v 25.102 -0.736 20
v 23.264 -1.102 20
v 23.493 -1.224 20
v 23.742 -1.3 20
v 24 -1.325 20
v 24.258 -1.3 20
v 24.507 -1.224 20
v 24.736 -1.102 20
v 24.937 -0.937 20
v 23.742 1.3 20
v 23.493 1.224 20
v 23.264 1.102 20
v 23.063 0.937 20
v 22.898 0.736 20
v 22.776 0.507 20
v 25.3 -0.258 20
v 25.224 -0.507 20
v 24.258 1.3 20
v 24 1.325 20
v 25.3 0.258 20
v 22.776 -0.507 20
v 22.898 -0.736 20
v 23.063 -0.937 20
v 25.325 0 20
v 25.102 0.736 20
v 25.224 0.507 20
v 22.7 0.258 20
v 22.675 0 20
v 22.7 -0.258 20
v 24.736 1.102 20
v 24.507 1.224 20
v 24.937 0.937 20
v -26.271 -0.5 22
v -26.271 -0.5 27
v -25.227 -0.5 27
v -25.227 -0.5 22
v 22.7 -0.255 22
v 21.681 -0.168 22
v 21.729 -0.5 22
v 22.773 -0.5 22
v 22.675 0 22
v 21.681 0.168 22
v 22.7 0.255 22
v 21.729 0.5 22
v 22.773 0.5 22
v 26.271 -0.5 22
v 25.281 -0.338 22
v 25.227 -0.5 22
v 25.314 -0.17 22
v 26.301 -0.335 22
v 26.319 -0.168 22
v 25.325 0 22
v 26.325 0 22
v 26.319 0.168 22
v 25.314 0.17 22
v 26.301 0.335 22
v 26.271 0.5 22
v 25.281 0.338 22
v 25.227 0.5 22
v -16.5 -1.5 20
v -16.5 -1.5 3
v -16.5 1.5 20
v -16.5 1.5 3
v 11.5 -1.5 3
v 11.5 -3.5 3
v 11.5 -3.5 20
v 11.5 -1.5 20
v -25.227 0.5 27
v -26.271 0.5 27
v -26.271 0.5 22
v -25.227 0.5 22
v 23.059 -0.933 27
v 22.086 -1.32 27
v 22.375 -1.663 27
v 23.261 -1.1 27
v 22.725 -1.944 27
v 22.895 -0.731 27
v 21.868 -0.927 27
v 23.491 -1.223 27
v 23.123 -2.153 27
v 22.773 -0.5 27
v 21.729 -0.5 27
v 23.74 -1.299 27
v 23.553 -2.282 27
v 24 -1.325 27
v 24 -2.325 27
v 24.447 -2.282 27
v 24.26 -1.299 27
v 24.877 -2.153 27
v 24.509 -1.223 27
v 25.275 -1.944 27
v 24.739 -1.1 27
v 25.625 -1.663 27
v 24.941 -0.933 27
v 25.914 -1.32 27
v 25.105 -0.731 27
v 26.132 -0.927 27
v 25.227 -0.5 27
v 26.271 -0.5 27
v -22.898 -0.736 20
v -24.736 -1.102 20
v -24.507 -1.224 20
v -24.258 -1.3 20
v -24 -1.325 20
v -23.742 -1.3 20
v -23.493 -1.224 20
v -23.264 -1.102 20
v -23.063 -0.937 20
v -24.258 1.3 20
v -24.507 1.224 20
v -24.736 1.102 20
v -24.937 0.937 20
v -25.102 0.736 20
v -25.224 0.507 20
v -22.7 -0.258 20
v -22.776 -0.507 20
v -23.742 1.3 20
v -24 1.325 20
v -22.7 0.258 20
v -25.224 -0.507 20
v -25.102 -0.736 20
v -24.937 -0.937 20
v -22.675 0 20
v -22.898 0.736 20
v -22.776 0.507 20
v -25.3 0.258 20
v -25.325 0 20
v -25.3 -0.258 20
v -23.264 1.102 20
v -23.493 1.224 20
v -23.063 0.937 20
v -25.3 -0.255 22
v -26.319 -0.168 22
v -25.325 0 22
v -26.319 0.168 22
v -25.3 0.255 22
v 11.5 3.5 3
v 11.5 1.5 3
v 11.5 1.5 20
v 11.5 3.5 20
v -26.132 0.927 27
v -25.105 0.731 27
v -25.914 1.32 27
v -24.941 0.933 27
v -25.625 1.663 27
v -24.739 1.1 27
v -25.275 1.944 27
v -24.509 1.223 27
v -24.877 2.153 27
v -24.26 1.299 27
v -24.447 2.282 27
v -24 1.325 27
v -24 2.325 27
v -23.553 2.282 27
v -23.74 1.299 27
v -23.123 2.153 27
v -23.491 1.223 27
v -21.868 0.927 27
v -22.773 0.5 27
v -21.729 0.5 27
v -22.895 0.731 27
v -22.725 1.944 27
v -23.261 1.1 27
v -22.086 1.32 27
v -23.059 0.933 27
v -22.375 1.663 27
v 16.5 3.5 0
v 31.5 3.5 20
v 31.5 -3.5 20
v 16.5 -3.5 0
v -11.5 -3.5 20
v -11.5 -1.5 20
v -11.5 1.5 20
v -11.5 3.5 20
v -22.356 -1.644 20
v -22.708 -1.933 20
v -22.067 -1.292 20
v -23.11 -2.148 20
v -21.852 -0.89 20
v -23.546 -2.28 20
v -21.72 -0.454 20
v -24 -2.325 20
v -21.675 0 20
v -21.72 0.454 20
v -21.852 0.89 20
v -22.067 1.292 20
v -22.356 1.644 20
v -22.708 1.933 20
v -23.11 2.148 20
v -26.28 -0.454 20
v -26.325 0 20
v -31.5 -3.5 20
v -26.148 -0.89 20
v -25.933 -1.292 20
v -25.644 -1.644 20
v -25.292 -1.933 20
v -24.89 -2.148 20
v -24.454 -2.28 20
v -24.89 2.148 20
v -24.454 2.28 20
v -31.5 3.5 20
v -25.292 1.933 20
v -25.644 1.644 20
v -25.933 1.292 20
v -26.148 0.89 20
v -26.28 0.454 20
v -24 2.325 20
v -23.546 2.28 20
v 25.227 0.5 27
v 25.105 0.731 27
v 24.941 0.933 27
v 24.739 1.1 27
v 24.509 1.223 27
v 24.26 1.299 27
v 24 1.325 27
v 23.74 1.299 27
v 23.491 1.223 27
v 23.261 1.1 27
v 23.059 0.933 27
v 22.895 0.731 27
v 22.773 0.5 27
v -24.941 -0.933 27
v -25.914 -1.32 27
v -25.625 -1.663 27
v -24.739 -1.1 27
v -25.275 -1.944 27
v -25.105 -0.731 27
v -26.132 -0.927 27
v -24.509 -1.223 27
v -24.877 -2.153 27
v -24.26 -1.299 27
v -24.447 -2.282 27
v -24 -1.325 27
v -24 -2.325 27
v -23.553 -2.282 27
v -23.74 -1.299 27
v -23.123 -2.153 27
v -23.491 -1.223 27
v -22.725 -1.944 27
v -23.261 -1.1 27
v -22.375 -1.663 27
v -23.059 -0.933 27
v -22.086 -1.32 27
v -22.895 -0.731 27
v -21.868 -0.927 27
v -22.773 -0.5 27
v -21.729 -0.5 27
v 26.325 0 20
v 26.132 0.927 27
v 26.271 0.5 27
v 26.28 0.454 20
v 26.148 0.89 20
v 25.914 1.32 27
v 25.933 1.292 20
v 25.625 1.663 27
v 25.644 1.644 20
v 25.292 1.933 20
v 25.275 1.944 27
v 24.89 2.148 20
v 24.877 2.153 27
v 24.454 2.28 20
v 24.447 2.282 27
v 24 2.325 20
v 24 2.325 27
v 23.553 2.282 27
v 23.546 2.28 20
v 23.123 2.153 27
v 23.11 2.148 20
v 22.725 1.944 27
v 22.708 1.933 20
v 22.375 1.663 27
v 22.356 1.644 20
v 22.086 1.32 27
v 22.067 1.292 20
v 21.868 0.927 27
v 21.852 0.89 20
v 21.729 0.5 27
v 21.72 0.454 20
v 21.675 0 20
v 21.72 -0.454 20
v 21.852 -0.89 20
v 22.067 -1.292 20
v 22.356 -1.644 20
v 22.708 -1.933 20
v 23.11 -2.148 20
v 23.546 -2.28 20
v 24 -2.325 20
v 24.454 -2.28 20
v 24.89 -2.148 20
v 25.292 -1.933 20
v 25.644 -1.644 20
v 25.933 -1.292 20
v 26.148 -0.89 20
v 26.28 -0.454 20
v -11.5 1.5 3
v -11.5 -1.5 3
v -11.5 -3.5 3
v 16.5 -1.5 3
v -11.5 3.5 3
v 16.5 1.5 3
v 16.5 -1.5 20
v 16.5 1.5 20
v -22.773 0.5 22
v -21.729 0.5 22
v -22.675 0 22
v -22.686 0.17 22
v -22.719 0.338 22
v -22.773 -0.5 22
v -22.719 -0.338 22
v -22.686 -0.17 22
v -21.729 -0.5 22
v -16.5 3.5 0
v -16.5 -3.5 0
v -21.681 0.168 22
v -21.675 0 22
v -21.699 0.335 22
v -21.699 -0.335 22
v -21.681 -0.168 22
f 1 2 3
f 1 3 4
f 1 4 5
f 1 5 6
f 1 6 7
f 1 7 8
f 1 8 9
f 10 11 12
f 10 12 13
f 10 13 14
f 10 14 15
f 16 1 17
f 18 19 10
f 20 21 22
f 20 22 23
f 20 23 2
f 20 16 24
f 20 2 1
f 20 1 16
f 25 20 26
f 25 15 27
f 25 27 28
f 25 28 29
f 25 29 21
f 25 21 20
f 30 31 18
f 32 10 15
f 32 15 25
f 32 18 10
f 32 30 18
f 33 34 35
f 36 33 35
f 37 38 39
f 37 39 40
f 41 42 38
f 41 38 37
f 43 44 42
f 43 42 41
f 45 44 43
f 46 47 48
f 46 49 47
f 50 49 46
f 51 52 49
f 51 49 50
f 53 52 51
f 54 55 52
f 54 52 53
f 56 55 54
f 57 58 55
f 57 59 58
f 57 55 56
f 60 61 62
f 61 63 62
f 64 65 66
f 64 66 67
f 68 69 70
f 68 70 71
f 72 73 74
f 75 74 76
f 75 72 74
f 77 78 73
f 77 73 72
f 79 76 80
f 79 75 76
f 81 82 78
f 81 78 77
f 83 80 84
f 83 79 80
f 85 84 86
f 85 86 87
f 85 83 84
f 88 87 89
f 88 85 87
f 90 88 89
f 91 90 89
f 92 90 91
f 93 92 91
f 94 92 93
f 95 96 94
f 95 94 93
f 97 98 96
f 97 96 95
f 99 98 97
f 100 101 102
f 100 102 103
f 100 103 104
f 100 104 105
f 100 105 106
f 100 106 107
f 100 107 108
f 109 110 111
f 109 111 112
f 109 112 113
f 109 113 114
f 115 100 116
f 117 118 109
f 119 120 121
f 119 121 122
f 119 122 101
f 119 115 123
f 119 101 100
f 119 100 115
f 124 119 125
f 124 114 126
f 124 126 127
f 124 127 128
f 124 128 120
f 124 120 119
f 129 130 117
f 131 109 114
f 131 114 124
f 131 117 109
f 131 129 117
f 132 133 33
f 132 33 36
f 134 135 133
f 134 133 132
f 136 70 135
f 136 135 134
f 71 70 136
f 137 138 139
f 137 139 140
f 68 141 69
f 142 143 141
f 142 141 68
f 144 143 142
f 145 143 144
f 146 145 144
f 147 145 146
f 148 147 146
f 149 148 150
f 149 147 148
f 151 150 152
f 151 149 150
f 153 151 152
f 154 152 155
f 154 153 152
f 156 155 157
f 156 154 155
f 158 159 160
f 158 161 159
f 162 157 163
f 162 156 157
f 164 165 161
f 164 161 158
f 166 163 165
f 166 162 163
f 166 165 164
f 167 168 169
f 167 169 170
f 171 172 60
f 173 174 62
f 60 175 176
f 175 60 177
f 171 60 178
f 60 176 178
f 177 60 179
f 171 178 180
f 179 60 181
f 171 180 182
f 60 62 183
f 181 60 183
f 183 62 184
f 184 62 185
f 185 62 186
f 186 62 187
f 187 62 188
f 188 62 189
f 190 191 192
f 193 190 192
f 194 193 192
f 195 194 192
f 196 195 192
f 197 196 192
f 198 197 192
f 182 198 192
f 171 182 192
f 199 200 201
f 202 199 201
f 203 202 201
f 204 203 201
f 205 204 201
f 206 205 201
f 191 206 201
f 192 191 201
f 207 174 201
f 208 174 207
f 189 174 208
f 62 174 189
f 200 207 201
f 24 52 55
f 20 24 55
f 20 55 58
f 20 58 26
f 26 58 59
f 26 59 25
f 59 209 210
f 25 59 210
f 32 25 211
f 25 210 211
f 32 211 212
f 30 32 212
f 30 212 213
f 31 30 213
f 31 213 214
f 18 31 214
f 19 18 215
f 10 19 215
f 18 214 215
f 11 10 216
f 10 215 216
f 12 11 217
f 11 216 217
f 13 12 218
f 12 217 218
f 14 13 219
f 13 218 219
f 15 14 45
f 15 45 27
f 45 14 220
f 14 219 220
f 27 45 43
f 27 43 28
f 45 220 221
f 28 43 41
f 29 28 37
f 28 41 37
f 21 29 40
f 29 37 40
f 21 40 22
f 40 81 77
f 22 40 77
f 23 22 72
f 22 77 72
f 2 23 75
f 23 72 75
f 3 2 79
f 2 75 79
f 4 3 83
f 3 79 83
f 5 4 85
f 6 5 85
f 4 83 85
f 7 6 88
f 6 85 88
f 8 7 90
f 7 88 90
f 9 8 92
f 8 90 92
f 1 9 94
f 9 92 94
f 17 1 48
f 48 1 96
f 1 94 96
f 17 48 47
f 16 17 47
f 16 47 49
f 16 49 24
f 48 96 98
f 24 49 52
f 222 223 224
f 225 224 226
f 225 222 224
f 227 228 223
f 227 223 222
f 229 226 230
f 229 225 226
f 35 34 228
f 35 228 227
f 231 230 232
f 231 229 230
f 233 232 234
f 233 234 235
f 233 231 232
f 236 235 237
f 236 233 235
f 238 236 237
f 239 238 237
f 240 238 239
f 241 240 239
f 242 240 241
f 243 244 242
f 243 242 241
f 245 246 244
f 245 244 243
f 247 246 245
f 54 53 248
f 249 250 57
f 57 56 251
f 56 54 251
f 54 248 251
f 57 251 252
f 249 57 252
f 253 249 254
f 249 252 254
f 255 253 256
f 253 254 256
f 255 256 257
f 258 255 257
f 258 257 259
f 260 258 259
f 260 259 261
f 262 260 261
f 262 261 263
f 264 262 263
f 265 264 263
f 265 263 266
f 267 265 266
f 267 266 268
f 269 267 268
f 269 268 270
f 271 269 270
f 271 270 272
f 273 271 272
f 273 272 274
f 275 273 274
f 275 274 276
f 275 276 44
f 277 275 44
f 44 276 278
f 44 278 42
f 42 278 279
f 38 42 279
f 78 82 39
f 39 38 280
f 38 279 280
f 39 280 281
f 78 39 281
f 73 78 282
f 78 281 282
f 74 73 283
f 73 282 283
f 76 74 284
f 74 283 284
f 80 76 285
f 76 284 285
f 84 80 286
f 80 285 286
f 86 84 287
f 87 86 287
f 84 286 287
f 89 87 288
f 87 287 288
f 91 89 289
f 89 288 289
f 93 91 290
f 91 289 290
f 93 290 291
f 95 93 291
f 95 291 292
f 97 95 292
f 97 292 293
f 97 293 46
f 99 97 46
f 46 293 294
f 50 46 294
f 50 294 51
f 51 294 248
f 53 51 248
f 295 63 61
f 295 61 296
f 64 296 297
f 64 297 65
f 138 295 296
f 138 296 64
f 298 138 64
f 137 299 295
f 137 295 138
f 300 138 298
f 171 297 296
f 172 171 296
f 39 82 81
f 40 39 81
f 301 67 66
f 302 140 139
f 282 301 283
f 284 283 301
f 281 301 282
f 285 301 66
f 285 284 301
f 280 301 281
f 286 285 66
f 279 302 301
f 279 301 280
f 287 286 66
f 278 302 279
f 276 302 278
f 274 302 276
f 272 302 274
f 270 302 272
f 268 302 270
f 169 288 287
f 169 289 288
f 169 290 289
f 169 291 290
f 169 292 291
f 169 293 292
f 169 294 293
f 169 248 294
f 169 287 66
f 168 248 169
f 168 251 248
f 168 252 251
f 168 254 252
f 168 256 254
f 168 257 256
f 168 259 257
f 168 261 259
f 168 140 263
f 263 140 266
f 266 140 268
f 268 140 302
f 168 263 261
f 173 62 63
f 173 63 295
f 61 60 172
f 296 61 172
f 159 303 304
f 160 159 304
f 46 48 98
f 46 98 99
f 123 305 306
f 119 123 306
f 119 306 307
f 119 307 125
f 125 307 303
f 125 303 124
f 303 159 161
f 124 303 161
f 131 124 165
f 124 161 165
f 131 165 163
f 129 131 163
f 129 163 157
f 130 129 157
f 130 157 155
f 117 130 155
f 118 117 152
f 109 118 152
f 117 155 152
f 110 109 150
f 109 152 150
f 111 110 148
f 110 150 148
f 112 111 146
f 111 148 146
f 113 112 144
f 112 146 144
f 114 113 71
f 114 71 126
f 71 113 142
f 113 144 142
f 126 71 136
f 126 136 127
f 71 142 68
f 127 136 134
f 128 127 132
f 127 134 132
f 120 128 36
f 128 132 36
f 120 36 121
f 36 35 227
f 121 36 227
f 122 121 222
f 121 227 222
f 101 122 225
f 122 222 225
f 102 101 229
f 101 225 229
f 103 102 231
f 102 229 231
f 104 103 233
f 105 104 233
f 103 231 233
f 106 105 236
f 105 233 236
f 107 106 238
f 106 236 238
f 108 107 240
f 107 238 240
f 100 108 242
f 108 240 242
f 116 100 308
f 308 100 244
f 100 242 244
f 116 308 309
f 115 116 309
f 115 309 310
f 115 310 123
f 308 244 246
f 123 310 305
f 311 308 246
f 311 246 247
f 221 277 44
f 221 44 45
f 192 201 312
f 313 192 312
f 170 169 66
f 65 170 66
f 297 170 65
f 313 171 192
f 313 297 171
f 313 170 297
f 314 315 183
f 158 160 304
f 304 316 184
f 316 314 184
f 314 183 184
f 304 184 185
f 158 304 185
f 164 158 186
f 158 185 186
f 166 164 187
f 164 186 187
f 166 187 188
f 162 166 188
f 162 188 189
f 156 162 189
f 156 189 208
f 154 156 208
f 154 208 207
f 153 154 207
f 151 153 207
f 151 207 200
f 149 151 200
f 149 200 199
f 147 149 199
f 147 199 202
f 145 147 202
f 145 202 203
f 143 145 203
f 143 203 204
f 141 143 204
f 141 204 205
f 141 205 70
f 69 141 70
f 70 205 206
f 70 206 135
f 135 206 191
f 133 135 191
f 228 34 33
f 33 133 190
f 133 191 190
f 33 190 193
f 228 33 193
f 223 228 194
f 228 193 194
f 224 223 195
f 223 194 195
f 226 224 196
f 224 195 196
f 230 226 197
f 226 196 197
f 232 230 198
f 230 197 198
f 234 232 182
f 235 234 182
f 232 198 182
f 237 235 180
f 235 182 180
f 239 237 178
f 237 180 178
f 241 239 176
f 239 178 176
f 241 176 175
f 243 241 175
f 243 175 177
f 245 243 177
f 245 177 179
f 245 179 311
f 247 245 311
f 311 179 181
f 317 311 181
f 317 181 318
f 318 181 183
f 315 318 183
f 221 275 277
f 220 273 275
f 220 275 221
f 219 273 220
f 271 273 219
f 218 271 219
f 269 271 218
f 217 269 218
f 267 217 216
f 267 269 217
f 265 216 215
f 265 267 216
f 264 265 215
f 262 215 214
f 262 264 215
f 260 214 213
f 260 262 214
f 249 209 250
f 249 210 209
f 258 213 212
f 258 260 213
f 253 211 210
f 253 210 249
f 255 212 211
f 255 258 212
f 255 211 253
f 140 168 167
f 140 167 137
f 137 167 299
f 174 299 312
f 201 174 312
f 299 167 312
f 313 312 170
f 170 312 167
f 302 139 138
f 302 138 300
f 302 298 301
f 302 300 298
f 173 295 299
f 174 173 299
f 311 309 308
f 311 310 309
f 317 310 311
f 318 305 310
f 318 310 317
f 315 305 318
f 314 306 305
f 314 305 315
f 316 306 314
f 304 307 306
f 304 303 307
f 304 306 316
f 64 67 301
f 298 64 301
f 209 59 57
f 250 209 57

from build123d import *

# Parameters (mm, degrees)
SKETCH1_W           = 33
SKETCH1_H           = 7
BOSS_EXTRUDE1_DEPTH = 3
SKETCH2_W           = 5
SKETCH2_H           = 2
BOSS_EXTRUDE2_DEPTH = 17
BOSS_EXTRUDE3_DEPTH = 7
SKETCH4_R           = 2.325
BOSS_EXTRUDE4_DEPTH = 7
SKETCH5_R           = 1.325
CUT_EXTRUDE1_DEPTH  = 7
SKETCH6_W           = 9.664864402
SKETCH6_H           = 1
SKETCH6_W_2         = 10.163169966
CUT_EXTRUDE2_DEPTH  = 5


with BuildPart() as part:
    # Sketch1 → Boss-Extrude1 (new body)
    with BuildSketch(Plane.XY):
        Rectangle(SKETCH1_W, SKETCH1_H)
    extrude(amount=BOSS_EXTRUDE1_DEPTH)

    # Sketch2 → Boss-Extrude2 (add)
    with BuildSketch(Plane.XY.offset(3)):
        with Locations((-14, 2.5)):
            Rectangle(SKETCH2_W, SKETCH2_H)
        with Locations((-14, -2.5)):
            Rectangle(SKETCH2_W, SKETCH2_H)
        with Locations((14, -2.5)):
            Rectangle(SKETCH2_W, SKETCH2_H)
        with Locations((14, 2.5)):
            Rectangle(SKETCH2_W, SKETCH2_H)
    extrude(amount=BOSS_EXTRUDE2_DEPTH)

    # Sketch3 → Boss-Extrude3 (add)
    with BuildSketch(Plane(origin=(0, 3.5, 0), x_dir=(1, 0, 0), z_dir=(0, 1, 0))):
        Polygon((-16.5, -20), (-31.5, -20), (-16.5, 0), align=None)
        Polygon((16.5, -20), (31.5, -20), (16.5, 0), align=None)
    extrude(amount=-BOSS_EXTRUDE3_DEPTH)

    # Sketch4 → Boss-Extrude4 (add)
    with BuildSketch(Plane.XY.offset(20)):
        with Locations((24, 0)):
            Circle(SKETCH4_R)
        with Locations((-24, 0)):
            Circle(SKETCH4_R)
    extrude(amount=BOSS_EXTRUDE4_DEPTH)

    # Sketch5 → Cut-Extrude1 (cut)
    with BuildSketch(Plane.XY.offset(27)):
        with Locations((-24, 0)):
            Circle(SKETCH5_R)
        with Locations((24, 0)):
            Circle(SKETCH5_R)
    extrude(amount=-CUT_EXTRUDE1_DEPTH, mode=Mode.SUBTRACT)

    # Sketch6 → Cut-Extrude2 (cut)
    with BuildSketch(Plane.XY.offset(27)):
        with Locations((-26.325, 0)):
            Rectangle(SKETCH6_W, SKETCH6_H)
        with Locations((26.325, 0)):
            Rectangle(SKETCH6_W_2, SKETCH6_H)
    extrude(amount=-CUT_EXTRUDE2_DEPTH, mode=Mode.SUBTRACT)


solid = part.part
